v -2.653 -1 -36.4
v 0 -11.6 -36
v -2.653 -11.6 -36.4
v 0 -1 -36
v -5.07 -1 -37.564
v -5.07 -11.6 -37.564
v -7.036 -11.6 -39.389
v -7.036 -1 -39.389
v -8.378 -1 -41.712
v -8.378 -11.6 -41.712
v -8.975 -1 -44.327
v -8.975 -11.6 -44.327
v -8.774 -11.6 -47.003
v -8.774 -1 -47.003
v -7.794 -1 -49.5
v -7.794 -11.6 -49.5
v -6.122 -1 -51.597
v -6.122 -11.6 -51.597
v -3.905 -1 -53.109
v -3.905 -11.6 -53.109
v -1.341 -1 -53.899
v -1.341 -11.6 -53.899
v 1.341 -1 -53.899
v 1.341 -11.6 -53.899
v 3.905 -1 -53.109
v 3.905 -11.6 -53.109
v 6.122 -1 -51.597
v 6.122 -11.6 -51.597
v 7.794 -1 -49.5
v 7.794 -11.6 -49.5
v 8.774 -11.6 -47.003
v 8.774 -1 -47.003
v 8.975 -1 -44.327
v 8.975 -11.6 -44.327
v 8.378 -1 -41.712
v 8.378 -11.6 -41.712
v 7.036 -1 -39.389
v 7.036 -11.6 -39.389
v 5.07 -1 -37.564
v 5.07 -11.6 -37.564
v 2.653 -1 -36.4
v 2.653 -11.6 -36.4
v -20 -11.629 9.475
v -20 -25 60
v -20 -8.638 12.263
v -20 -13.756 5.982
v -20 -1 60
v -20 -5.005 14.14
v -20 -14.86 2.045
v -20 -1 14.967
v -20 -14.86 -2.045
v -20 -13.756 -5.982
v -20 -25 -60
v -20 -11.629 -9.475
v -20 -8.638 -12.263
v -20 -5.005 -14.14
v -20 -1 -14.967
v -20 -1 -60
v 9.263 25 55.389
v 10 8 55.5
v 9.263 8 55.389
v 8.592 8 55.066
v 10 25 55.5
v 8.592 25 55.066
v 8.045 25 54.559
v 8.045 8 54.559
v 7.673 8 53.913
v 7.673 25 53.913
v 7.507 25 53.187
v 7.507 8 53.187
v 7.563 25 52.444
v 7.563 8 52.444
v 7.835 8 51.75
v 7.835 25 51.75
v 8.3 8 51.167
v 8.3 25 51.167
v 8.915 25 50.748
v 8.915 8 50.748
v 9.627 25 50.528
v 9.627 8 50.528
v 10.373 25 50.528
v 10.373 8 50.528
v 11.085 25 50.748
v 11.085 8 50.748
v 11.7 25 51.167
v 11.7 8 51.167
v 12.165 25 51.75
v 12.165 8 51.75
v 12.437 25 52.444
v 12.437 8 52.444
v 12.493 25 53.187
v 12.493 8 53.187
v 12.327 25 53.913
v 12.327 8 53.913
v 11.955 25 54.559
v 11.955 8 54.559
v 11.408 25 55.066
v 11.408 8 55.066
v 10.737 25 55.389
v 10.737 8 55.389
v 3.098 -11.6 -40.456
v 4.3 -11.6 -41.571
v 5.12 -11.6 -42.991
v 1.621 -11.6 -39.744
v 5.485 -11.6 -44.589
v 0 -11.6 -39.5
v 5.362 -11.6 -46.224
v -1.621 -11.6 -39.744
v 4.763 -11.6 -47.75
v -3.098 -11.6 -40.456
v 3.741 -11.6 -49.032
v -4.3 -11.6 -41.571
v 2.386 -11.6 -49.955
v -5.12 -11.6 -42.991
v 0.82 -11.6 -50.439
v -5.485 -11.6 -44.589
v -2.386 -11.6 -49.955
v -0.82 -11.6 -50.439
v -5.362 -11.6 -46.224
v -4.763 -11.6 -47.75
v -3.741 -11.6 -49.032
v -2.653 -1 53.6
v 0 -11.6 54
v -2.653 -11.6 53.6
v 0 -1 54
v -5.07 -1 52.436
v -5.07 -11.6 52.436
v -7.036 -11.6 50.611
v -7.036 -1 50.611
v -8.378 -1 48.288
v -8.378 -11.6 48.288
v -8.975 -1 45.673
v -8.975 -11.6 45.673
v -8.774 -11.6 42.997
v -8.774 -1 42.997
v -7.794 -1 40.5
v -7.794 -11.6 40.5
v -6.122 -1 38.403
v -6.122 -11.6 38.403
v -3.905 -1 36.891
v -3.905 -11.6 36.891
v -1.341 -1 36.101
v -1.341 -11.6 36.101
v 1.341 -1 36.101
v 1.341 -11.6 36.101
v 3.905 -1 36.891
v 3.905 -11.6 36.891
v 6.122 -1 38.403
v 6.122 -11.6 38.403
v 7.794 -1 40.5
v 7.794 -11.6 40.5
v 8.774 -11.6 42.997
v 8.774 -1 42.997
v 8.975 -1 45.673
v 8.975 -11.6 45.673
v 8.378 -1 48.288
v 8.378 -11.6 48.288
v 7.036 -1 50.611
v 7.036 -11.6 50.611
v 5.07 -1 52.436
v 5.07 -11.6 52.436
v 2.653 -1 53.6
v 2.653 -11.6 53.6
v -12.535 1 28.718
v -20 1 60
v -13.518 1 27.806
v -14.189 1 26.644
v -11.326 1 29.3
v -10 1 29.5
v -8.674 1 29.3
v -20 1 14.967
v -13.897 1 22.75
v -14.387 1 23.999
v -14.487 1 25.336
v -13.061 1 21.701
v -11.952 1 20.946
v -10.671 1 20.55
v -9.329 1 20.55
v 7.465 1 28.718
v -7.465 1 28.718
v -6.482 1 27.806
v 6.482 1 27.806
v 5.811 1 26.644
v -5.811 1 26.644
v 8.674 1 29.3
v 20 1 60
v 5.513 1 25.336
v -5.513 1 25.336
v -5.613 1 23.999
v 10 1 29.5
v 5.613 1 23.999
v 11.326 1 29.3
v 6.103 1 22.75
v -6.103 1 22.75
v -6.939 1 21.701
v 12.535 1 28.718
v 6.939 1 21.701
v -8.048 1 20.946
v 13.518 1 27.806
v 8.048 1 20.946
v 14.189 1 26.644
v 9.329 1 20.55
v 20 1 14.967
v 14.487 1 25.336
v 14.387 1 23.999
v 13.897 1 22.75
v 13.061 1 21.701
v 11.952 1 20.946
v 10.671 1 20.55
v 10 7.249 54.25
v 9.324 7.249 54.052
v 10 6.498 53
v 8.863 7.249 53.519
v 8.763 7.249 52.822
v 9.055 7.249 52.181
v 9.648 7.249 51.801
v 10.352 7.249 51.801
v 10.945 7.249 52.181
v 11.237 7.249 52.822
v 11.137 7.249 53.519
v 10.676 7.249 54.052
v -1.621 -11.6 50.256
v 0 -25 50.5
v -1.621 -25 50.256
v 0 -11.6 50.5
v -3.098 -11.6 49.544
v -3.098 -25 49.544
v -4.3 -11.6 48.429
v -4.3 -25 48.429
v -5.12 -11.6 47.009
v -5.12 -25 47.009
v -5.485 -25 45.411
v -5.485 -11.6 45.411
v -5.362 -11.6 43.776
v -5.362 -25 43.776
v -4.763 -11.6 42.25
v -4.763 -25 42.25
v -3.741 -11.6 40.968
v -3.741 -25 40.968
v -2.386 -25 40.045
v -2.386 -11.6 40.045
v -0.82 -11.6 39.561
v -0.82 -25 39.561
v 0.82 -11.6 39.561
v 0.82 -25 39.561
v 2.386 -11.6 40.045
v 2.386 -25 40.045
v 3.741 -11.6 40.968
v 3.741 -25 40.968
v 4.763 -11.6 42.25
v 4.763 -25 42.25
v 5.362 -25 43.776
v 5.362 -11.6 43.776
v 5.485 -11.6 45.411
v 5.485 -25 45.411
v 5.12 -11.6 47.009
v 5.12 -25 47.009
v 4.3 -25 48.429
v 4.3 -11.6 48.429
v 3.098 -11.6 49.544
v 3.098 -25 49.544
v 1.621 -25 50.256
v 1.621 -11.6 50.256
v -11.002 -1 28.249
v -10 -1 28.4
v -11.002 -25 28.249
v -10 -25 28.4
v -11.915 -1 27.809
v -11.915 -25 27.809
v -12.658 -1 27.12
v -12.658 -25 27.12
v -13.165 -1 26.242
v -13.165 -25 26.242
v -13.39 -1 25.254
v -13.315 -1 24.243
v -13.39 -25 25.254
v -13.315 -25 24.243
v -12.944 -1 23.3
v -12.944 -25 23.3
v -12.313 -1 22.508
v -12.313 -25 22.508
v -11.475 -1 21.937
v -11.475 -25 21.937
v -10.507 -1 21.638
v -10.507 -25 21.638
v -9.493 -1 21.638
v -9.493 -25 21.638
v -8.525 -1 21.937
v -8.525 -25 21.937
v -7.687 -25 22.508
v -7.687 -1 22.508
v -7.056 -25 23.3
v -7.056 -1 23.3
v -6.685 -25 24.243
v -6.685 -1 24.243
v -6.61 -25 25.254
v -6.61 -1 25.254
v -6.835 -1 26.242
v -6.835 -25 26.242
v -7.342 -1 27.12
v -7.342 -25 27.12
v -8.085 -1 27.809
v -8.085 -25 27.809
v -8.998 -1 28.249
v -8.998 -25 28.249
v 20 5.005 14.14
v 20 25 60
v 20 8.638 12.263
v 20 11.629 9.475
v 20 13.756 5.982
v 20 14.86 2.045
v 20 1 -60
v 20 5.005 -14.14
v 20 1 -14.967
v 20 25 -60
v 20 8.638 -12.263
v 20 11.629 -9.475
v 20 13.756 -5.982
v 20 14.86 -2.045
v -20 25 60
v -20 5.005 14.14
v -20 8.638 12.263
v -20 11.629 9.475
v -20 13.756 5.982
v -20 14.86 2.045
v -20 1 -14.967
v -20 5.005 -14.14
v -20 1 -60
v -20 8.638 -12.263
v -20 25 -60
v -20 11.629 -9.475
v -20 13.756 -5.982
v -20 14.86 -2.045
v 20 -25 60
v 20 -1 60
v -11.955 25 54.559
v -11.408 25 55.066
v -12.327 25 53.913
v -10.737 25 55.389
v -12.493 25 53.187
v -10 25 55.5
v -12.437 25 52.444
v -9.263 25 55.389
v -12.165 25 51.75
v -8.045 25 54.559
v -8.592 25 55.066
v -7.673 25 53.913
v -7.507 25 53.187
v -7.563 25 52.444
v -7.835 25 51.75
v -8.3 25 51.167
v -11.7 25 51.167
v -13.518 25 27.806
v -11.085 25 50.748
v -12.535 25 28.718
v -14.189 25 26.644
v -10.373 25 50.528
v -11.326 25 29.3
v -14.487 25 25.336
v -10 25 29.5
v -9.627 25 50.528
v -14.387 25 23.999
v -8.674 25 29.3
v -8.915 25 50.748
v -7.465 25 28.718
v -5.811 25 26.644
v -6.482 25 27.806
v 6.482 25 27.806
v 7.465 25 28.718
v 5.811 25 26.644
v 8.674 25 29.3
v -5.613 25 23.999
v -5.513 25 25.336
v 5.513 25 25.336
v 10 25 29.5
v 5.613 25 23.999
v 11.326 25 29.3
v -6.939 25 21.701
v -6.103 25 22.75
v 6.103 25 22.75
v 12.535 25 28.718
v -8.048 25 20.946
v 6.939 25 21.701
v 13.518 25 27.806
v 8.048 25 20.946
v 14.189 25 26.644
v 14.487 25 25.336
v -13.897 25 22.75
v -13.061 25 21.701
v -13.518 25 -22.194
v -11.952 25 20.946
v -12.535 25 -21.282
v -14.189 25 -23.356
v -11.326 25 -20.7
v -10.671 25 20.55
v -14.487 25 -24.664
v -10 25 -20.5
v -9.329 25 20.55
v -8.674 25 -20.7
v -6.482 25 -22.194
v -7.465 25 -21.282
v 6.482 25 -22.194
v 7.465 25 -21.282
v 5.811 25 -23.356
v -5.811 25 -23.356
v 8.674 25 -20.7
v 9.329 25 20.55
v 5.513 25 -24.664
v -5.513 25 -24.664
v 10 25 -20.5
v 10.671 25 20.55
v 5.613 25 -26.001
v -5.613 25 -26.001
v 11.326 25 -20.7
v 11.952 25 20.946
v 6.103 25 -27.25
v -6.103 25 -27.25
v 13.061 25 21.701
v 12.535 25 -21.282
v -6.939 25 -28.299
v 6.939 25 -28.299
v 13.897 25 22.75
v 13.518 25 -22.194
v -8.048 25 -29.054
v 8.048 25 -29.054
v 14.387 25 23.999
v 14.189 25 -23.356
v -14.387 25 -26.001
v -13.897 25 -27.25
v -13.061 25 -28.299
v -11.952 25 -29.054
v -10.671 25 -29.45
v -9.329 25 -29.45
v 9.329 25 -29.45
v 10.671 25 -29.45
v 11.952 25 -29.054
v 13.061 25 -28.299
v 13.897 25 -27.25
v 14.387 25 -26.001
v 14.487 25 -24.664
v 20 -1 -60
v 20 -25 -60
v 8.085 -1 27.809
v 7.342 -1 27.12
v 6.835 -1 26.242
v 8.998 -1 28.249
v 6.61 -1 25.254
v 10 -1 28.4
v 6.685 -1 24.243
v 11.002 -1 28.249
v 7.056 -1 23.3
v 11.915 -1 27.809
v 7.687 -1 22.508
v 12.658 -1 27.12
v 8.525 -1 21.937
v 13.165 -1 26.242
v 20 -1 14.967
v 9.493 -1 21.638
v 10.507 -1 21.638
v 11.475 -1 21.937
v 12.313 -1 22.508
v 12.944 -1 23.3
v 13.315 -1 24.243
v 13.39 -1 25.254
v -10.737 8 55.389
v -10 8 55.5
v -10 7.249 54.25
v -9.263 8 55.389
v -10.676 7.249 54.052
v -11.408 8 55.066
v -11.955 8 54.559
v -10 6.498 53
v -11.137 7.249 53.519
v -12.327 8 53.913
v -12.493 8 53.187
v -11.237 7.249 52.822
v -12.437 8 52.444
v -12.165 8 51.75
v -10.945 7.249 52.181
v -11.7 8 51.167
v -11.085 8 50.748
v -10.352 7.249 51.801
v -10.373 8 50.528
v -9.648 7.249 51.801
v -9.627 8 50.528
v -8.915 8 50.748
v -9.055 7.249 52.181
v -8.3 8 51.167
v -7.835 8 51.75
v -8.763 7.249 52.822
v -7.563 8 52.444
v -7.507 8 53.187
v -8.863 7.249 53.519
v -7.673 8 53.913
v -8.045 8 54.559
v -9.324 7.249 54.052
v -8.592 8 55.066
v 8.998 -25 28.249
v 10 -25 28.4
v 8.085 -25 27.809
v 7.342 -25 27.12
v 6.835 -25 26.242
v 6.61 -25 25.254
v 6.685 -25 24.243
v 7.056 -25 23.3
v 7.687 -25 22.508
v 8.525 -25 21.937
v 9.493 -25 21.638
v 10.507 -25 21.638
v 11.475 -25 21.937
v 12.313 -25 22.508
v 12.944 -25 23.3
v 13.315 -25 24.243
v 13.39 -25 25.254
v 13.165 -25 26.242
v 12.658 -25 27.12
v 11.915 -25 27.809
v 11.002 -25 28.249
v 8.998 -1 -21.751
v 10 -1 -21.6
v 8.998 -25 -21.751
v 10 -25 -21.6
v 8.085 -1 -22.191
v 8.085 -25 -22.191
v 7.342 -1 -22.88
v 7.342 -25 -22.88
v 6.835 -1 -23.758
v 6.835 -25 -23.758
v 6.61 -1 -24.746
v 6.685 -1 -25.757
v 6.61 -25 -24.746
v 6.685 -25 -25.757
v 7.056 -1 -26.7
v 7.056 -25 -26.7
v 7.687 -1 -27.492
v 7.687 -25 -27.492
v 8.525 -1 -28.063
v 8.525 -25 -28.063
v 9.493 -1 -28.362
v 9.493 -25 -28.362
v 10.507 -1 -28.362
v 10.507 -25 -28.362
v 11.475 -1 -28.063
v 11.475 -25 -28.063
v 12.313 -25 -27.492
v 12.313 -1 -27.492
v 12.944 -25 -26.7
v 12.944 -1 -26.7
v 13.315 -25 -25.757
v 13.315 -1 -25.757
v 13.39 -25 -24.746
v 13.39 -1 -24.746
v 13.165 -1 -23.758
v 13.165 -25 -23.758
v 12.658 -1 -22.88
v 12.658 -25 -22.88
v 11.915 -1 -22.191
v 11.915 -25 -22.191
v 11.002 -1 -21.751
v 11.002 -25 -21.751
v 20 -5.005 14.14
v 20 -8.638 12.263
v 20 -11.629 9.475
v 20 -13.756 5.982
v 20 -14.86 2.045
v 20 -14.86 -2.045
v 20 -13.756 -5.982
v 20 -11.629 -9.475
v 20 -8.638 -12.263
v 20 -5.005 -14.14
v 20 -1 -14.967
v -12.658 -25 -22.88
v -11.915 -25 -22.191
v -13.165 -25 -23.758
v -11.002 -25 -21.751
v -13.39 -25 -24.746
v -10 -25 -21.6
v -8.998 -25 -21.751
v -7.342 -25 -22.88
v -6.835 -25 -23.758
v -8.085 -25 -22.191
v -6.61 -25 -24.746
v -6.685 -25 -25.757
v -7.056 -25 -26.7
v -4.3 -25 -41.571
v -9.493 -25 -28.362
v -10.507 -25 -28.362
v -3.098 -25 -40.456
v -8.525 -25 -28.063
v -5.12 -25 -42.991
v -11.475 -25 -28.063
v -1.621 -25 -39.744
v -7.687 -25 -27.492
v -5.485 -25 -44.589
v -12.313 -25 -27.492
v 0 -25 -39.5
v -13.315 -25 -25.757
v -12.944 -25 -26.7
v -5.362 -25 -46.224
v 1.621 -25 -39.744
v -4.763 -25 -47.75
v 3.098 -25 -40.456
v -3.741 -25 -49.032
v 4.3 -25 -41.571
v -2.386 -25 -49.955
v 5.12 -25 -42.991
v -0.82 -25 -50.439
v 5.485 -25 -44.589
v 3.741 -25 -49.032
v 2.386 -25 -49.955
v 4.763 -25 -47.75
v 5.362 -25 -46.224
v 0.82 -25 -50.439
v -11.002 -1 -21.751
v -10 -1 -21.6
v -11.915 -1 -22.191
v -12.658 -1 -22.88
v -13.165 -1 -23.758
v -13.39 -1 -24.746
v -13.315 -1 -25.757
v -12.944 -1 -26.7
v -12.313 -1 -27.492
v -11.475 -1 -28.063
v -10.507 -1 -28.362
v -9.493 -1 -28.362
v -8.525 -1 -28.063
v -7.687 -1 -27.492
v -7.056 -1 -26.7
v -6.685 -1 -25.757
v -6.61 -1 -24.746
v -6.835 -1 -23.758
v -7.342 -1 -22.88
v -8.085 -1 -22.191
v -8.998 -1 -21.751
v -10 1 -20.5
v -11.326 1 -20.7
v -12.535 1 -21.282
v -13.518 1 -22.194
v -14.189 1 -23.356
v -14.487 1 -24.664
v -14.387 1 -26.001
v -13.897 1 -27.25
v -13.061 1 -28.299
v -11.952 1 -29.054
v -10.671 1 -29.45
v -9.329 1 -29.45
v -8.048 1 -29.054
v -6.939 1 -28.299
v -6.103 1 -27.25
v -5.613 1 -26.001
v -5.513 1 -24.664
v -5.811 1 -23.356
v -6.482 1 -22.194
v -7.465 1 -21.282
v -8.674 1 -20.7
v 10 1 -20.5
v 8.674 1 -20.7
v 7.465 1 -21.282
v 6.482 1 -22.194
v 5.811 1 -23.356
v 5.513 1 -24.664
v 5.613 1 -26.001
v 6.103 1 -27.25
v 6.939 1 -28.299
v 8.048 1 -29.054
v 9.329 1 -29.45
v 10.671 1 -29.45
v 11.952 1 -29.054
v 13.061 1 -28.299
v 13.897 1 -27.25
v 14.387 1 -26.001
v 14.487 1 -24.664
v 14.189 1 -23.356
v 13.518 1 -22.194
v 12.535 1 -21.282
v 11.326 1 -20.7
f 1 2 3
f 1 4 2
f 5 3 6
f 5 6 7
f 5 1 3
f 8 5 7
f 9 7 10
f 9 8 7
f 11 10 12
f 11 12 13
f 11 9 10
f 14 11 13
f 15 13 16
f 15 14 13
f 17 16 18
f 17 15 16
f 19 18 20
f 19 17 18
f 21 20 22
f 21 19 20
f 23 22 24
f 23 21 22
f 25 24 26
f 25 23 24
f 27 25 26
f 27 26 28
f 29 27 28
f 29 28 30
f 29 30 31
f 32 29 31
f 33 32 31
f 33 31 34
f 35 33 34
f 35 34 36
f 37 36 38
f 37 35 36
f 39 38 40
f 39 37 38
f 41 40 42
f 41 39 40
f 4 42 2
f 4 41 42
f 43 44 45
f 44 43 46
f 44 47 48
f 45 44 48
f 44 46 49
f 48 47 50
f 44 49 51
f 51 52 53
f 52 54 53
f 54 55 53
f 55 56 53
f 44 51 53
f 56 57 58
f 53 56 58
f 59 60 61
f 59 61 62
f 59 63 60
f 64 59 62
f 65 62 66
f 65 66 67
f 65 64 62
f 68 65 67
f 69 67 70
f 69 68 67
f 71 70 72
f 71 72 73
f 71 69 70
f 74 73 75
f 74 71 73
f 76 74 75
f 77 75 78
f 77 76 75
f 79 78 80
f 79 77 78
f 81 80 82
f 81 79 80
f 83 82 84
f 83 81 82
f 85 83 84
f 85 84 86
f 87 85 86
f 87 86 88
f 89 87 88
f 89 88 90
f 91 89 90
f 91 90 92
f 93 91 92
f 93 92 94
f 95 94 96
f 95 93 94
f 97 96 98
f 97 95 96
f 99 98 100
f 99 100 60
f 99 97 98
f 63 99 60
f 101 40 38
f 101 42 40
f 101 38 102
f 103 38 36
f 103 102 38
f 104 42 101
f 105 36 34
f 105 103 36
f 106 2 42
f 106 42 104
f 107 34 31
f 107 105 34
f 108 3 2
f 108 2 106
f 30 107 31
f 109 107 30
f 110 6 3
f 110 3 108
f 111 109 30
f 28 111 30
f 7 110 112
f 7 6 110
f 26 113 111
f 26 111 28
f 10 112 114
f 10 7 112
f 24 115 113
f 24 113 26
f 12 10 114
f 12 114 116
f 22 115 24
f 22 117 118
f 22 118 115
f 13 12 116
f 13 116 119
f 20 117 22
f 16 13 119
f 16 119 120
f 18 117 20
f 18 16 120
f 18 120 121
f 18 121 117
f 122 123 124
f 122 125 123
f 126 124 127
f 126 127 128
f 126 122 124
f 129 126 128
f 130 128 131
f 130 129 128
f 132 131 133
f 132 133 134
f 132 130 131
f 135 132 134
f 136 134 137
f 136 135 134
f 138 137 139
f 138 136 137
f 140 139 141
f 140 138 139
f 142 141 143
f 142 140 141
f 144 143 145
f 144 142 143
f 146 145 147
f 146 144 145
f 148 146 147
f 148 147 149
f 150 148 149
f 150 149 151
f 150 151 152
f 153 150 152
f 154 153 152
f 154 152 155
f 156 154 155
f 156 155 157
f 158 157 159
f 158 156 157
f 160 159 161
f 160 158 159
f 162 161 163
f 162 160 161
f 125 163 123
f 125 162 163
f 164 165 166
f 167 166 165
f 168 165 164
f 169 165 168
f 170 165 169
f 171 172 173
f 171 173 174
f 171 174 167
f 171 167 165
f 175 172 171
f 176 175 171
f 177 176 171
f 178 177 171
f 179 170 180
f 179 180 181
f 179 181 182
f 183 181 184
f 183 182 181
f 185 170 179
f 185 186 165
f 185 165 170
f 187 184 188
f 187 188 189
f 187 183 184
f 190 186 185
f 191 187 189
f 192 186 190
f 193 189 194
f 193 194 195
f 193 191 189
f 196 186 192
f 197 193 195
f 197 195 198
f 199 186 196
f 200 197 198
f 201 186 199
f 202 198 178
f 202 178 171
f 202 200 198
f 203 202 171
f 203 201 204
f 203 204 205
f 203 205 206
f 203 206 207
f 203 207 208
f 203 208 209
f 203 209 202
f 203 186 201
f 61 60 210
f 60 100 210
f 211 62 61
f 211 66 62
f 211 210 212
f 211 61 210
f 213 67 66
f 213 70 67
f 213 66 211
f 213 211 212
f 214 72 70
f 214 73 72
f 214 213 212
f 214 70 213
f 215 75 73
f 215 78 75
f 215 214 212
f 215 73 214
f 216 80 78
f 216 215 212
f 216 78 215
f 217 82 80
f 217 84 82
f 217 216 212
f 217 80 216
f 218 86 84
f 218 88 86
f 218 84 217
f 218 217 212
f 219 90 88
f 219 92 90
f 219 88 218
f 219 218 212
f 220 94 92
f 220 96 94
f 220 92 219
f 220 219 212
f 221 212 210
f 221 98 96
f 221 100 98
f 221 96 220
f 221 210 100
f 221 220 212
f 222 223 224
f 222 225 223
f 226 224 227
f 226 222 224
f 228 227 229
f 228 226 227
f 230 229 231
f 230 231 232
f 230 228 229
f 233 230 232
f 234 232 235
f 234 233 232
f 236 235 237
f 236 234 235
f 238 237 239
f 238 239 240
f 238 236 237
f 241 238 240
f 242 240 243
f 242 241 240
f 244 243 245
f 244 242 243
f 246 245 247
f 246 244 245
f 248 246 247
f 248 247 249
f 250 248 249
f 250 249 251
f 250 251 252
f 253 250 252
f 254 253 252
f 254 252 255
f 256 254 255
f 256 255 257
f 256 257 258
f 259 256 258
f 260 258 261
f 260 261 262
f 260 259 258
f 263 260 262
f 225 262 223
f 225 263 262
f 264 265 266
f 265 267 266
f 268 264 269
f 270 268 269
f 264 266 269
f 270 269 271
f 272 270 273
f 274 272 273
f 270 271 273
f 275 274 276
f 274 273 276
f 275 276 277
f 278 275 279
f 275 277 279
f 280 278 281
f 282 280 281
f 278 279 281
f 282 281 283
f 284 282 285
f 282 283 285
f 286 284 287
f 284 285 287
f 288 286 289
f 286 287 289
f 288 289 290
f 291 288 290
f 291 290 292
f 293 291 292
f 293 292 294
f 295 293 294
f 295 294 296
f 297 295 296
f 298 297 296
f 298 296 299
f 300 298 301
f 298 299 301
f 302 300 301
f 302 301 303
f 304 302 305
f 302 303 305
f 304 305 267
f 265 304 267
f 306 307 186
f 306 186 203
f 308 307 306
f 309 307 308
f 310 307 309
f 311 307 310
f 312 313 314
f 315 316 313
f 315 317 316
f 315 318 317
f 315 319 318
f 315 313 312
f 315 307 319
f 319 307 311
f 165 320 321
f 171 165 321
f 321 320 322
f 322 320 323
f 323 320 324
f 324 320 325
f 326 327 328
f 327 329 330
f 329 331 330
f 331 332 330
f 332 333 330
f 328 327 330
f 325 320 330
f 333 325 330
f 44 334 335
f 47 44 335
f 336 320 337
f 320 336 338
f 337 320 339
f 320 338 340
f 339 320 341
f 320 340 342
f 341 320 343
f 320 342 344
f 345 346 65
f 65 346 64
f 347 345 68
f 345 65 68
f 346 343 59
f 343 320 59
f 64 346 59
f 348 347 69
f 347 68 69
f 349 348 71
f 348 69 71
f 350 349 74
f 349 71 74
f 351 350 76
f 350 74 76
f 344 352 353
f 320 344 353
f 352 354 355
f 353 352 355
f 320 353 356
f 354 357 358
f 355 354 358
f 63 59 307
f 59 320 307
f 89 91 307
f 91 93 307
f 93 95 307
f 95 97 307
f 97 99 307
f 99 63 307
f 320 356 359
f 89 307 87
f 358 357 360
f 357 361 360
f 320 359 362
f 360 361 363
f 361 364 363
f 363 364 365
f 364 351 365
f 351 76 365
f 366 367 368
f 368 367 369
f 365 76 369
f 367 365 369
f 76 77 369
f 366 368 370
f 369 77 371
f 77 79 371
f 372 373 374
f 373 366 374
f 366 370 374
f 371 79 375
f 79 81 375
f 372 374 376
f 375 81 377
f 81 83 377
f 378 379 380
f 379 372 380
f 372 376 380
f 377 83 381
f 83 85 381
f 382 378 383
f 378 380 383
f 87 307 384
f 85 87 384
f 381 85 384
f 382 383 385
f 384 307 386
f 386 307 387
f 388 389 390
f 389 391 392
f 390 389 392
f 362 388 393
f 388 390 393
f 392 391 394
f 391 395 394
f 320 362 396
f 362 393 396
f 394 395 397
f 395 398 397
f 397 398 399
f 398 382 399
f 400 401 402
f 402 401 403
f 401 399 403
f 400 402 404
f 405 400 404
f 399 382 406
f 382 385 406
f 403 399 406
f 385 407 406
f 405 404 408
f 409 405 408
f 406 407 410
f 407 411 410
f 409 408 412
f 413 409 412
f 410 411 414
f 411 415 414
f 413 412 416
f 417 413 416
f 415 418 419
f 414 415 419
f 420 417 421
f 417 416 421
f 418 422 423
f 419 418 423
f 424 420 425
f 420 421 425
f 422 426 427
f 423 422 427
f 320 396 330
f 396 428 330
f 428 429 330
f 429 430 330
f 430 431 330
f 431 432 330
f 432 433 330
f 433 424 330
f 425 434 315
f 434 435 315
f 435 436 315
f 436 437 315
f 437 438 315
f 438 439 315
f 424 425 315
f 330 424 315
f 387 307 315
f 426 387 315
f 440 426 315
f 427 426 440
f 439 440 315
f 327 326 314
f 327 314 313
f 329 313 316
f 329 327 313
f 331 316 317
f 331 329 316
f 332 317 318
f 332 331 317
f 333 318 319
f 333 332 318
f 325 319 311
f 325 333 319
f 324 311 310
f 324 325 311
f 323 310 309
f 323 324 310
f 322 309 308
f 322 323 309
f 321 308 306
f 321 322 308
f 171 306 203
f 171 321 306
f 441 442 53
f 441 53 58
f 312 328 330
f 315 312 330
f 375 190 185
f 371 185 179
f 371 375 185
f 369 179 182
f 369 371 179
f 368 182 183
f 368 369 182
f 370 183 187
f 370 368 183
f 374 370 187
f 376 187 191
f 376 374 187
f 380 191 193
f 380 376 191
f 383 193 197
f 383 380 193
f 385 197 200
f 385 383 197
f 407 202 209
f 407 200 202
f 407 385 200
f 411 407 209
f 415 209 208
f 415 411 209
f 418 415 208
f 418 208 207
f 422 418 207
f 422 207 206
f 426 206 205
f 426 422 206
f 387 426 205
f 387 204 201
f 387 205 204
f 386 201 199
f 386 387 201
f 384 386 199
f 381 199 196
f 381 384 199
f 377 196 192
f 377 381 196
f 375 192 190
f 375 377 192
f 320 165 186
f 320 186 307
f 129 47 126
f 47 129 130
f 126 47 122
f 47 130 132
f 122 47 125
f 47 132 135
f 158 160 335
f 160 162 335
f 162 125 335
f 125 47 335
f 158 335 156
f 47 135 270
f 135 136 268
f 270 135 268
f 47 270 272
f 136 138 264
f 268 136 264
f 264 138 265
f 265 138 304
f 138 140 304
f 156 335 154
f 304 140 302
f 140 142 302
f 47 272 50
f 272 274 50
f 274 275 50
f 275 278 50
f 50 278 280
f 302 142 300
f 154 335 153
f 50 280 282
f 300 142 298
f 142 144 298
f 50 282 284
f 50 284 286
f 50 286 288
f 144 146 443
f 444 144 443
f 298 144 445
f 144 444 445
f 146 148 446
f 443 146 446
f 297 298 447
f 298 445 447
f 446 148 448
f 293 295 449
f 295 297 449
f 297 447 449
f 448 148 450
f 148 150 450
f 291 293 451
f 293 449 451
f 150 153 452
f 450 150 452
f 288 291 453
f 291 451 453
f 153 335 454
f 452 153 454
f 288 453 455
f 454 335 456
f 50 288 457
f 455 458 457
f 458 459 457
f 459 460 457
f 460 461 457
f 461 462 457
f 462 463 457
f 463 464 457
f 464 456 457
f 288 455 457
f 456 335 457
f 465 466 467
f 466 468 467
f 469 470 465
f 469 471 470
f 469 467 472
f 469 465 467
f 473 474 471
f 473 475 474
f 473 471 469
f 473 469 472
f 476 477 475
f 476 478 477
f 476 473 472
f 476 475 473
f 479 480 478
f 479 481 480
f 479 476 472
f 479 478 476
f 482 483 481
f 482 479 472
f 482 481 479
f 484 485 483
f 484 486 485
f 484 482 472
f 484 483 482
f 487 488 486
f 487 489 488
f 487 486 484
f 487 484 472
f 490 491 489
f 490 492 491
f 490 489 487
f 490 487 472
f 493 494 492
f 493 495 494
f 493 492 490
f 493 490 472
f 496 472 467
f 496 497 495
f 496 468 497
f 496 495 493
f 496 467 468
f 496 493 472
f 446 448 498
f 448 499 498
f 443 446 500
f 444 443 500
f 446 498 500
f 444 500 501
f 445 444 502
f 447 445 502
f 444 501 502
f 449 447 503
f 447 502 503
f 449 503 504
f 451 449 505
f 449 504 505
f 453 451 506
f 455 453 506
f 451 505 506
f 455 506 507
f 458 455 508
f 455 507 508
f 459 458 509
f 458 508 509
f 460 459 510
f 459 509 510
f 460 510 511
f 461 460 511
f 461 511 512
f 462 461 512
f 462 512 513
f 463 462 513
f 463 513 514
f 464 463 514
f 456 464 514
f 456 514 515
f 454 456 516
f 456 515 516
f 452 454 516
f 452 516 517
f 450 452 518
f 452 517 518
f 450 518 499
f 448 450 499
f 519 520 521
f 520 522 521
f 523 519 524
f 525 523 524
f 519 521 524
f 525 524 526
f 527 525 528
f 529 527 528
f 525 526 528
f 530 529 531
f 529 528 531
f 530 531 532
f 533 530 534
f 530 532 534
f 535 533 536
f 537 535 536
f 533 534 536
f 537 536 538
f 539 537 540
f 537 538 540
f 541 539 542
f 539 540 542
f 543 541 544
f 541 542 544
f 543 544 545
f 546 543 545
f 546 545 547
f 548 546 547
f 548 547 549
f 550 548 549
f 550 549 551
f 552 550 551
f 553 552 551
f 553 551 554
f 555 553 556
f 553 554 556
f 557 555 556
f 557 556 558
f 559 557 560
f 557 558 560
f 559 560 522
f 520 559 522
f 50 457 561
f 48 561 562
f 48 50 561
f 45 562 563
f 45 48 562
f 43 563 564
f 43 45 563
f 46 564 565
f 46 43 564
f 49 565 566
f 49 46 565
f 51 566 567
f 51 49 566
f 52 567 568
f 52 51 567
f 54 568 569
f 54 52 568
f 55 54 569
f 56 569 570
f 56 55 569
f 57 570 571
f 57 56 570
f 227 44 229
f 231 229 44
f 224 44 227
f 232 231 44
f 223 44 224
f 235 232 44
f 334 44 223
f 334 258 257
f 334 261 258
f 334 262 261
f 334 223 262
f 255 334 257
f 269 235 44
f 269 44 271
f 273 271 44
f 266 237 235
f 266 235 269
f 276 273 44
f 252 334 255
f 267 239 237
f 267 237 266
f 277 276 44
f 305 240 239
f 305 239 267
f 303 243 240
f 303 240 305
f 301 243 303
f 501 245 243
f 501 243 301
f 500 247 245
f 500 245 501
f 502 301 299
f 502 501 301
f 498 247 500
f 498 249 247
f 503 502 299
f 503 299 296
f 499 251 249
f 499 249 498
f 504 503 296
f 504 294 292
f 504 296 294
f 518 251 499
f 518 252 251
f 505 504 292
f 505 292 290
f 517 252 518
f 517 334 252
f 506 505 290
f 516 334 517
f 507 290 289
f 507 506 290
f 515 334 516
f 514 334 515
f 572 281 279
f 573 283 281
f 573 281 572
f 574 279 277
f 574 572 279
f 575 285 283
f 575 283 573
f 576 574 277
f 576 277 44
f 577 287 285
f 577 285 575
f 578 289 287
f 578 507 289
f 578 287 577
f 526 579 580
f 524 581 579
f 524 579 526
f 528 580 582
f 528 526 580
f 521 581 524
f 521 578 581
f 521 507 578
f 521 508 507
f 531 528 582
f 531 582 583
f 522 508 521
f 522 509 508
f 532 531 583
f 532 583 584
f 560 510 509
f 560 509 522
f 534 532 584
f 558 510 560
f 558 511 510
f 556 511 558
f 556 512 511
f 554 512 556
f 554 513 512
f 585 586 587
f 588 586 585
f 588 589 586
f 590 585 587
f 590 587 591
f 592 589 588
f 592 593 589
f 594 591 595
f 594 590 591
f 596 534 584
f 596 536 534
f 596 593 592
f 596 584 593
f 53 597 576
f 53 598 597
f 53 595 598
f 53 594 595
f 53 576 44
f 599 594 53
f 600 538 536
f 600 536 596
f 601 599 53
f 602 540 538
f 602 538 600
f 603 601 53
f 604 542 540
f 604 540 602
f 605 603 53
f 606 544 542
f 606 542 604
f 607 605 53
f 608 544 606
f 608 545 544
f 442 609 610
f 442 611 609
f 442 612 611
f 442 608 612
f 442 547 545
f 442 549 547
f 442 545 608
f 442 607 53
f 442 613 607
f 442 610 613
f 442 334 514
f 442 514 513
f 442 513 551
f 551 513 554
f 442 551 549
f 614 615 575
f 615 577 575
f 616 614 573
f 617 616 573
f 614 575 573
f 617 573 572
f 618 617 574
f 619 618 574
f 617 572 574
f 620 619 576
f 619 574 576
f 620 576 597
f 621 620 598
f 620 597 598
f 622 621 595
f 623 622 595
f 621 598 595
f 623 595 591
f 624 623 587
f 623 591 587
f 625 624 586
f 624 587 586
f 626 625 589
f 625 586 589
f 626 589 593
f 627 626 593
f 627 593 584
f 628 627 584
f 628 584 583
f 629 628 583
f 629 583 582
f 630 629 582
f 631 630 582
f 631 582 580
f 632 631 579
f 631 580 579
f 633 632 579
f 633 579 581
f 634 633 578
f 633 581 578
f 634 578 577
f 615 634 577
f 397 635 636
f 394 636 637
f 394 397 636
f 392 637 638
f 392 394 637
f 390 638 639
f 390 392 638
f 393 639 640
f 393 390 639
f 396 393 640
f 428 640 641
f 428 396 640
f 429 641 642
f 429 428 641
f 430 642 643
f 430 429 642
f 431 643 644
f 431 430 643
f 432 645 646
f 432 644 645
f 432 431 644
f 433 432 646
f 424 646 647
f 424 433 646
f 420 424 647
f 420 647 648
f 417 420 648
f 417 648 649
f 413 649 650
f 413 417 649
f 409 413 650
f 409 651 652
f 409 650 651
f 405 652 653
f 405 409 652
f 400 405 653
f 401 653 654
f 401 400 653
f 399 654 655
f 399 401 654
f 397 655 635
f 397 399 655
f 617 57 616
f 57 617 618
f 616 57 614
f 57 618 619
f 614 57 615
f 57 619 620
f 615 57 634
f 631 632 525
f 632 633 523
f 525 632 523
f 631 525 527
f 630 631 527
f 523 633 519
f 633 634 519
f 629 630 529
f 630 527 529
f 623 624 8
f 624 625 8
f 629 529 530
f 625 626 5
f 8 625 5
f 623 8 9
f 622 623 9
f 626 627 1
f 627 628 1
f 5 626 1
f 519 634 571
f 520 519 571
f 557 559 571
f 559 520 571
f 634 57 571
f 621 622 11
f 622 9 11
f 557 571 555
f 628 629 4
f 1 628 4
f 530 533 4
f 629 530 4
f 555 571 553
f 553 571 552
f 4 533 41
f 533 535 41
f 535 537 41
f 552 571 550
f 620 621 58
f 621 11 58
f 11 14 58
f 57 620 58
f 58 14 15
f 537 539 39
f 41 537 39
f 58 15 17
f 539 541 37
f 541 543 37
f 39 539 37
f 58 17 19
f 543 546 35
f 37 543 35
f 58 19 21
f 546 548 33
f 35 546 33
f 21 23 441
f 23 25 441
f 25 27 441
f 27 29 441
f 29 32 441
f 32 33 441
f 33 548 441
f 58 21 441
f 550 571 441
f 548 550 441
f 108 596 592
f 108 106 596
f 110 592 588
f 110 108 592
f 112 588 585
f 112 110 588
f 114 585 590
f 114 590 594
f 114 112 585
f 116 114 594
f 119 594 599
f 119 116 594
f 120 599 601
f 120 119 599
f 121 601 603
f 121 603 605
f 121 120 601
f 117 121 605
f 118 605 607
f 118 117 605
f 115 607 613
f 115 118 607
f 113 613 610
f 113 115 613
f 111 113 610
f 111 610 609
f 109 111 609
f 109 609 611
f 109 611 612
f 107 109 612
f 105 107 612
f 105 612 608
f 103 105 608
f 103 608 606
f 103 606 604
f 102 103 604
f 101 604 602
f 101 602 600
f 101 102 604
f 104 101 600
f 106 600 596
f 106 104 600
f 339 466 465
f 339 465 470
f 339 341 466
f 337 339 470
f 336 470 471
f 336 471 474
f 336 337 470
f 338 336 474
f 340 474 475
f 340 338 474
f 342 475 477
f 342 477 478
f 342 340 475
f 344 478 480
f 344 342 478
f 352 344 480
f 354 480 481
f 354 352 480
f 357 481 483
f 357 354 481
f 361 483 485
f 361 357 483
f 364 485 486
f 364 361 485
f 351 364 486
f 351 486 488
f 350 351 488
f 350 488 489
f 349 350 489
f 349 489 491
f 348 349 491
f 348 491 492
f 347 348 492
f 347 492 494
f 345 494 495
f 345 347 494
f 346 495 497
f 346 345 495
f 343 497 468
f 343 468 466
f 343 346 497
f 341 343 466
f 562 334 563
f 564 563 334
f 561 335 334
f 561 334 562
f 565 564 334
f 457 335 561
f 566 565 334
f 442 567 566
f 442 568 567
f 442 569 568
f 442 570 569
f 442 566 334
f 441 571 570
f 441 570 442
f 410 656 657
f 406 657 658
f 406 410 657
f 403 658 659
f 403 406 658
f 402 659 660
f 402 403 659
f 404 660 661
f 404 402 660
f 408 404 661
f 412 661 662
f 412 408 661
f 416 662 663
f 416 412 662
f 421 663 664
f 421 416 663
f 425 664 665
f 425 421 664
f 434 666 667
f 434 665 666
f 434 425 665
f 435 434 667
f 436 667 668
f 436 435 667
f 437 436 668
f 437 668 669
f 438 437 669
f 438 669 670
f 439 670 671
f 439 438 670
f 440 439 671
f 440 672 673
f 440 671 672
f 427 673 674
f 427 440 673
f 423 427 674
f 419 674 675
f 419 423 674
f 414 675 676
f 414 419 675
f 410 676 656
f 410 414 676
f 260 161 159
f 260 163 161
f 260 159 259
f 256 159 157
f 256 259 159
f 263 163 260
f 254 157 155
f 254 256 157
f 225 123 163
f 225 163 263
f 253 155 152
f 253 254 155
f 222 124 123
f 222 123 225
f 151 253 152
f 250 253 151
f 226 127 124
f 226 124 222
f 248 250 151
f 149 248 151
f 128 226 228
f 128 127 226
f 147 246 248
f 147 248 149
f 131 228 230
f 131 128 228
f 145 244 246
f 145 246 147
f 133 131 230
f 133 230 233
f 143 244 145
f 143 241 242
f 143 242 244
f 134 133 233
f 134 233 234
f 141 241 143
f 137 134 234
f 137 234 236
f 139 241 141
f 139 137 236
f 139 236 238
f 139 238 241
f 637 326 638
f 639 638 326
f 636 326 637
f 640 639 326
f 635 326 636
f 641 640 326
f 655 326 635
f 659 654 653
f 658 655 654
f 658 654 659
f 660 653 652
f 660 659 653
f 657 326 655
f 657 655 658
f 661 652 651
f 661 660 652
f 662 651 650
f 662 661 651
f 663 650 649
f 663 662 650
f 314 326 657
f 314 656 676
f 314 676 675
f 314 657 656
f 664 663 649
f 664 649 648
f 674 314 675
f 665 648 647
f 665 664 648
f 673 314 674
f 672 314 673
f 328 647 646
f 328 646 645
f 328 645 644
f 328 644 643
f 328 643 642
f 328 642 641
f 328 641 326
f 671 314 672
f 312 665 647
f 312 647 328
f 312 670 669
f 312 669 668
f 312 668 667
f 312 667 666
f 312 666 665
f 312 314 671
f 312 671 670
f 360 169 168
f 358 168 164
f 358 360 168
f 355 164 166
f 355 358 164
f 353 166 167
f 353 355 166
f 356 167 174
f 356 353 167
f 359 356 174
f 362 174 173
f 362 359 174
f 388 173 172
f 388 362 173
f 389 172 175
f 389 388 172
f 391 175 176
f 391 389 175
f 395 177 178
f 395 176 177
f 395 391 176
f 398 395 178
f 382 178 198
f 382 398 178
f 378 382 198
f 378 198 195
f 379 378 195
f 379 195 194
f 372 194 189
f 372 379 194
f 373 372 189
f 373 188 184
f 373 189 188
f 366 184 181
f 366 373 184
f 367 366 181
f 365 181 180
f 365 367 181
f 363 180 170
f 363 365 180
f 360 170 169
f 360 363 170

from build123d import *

# Parameters (mm, degrees)
SKIZZE1_W                                    = 120
SKIZZE1_H                                    = 50
SKIZZE1_R                                    = 15
AUFSATZ_LINEAR_AUSTRAGEN1_DEPTH              = 20
SKIZZE2_W                                    = 120
SKIZZE2_H                                    = 2
SCHNITT_LINEAR_AUSTRAGEN1_DEPTH              = 77.321687612
SKIZZE3_W                                    = 3.4
SKIZZE3_H                                    = 24
M8_GEWINDEBOHRUNG1_AT_2_COUNT                = 2
M8_GEWINDEBOHRUNG1_AT_2_PITCH                = 50
M8_GEWINDEBOHRUNG1_AT_3_COUNT                = 2
M8_GEWINDEBOHRUNG1_AT_3_PITCH                = 53.851648071
M8_GEWINDEBOHRUNG1_AT_4_COUNT                = 2
M8_GEWINDEBOHRUNG1_AT_4_PITCH                = 20
F_9_0_9_DURCHMESSER_BOHRUNG1_AT_2_COUNT      = 2
F_9_0_9_DURCHMESSER_BOHRUNG1_AT_2_PITCH      = 50
F_9_0_9_DURCHMESSER_BOHRUNG1_AT_3_COUNT      = 2
F_9_0_9_DURCHMESSER_BOHRUNG1_AT_3_PITCH      = 53.851648071
F_9_0_9_DURCHMESSER_BOHRUNG1_AT_4_COUNT      = 2
F_9_0_9_DURCHMESSER_BOHRUNG1_AT_4_PITCH      = 20
STIRNSENKUNG_F_R_M10_ZYLINDERSCHRAUB_2_COUNT = 2
STIRNSENKUNG_F_R_M10_ZYLINDERSCHRAUB_2_PITCH = 90
M6_GEWINDEBOHRUNG1_AT_2_COUNT                = 2
M6_GEWINDEBOHRUNG1_AT_2_PITCH                = 20


with BuildPart() as part:
    # Skizze1 → Aufsatz-Linear austragen1 (new, symmetric)
    with BuildSketch(Plane(origin=(0, 0, 0), x_dir=(0, 0, -1), z_dir=(1, 0, 0))):
        Rectangle(SKIZZE1_W, SKIZZE1_H)
        Circle(SKIZZE1_R, mode=Mode.SUBTRACT)
    extrude(amount=AUFSATZ_LINEAR_AUSTRAGEN1_DEPTH, both=True)

    # Skizze2 → Schnitt-Linear austragen1 (cut, through all)
    with BuildSketch(Plane(origin=(20, 0, 0), x_dir=(0, 0, -1), z_dir=(1, 0, 0))):
        Rectangle(SKIZZE2_W, SKIZZE2_H)
    extrude(amount=-SCHNITT_LINEAR_AUSTRAGEN1_DEPTH, mode=Mode.SUBTRACT)


with BuildPart() as schnitt_linear_austragen1_piece_1:
    # of the separate pieces the step leaves, piece 1, a body of its own (schnitt_linear_austragen1_pieces)
    add(part.part.solids().sort_by_distance((-20, 25, 60))[0])

    # Skizze5 → Ø9.0 (9) Durchmesser Bohrung1 (revolve, cut)
    with BuildSketch(Plane(origin=(-10, 25, 25), x_dir=(0, 0, 1), z_dir=(1, 0, 0))):
        Polygon((0, 0), (0, 27.703872786), (4.5, 25), (4.5, 0), align=None)
    f_9_0_9_durchmesser_bohrung1 = revolve(axis=Axis((-10, 31.35, 25), (0, -1, 0)), mode=Mode.SUBTRACT)

    # Ø9.0 (9) Durchmesser Bohrung1 at 2: Ø9.0 (9) Durchmesser Bohrung1 ×2
    with Locations(*[(0, 0, -i * F_9_0_9_DURCHMESSER_BOHRUNG1_AT_2_PITCH) for i in range(1, F_9_0_9_DURCHMESSER_BOHRUNG1_AT_2_COUNT)]):
        add(f_9_0_9_durchmesser_bohrung1, mode=Mode.SUBTRACT)

    # Ø9.0 (9) Durchmesser Bohrung1 at 3: Ø9.0 (9) Durchmesser Bohrung1 ×2
    with Locations(*[Vector(0.3713906763541037, 0, -0.9284766908852593) * (i * F_9_0_9_DURCHMESSER_BOHRUNG1_AT_3_PITCH) for i in range(1, F_9_0_9_DURCHMESSER_BOHRUNG1_AT_3_COUNT)]):
        add(f_9_0_9_durchmesser_bohrung1, mode=Mode.SUBTRACT)

    # Ø9.0 (9) Durchmesser Bohrung1 at 4: Ø9.0 (9) Durchmesser Bohrung1 ×2
    with Locations(*[(i * F_9_0_9_DURCHMESSER_BOHRUNG1_AT_4_PITCH, 0, 0) for i in range(1, F_9_0_9_DURCHMESSER_BOHRUNG1_AT_4_COUNT)]):
        add(f_9_0_9_durchmesser_bohrung1, mode=Mode.SUBTRACT)

    # Skizze9 → M6 Gewindebohrung1 (revolve, cut)
    with BuildSketch(Plane(origin=(-10, 25, 53), x_dir=(0, 0, 1), z_dir=(1, 0, 0))):
        Polygon((0, 0), (0, 18.502151548), (2.5, 17), (2.5, 0), align=None)
    m6_gewindebohrung1 = revolve(axis=Axis((-10, 31.35, 53), (0, -1, 0)), mode=Mode.SUBTRACT)

    # M6 Gewindebohrung1 at 2: M6 Gewindebohrung1 ×2
    with Locations(*[(i * M6_GEWINDEBOHRUNG1_AT_2_PITCH, 0, 0) for i in range(1, M6_GEWINDEBOHRUNG1_AT_2_COUNT)]):
        add(m6_gewindebohrung1, mode=Mode.SUBTRACT)


with BuildPart() as schnitt_linear_austragen1_piece_2:
    # of the separate pieces the step leaves, piece 2, a body of its own (schnitt_linear_austragen1_pieces)
    add(part.part.solids().sort_by_distance((-20, -25, 60))[0])

    # Skizze3 → M8 Gewindebohrung1 (revolve, cut)
    with BuildSketch(Plane(origin=(10, -1, 25), x_dir=(0, 0, 1), z_dir=(1, 0, 0))):
        with Locations((1.7, 12)):
            Rectangle(SKIZZE3_W, SKIZZE3_H)
    m8_gewindebohrung1 = revolve(axis=Axis((10, 5.35, 25), (0, -1, 0)), mode=Mode.SUBTRACT)

    # M8 Gewindebohrung1 at 2: M8 Gewindebohrung1 ×2
    with Locations(*[(0, 0, -i * M8_GEWINDEBOHRUNG1_AT_2_PITCH) for i in range(1, M8_GEWINDEBOHRUNG1_AT_2_COUNT)]):
        add(m8_gewindebohrung1, mode=Mode.SUBTRACT)

    # M8 Gewindebohrung1 at 3: M8 Gewindebohrung1 ×2
    with Locations(*[Vector(-0.3713906763541038, 0, -0.9284766908852593) * (i * M8_GEWINDEBOHRUNG1_AT_3_PITCH) for i in range(1, M8_GEWINDEBOHRUNG1_AT_3_COUNT)]):
        add(m8_gewindebohrung1, mode=Mode.SUBTRACT)

    # M8 Gewindebohrung1 at 4: M8 Gewindebohrung1 ×2
    with Locations(*[(-i * M8_GEWINDEBOHRUNG1_AT_4_PITCH, 0, 0) for i in range(1, M8_GEWINDEBOHRUNG1_AT_4_COUNT)]):
        add(m8_gewindebohrung1, mode=Mode.SUBTRACT)

    # Skizze7 → Stirnsenkung für M10 Zylinderschraube mit Innensechskant2 (revolve, cut)
    with BuildSketch(Plane(origin=(0, -1, 45), x_dir=(0, 0, 1), z_dir=(1, 0, 0))):
        Polygon((0, 0), (0, 24), (5.5, 24), (5.5, 10.6), (9, 10.6), (9, 0), align=None)
    stirnsenkung_f_r_m10_zylinderschraube_mi = revolve(axis=Axis((0, 5.35, 45), (0, -1, 0)), mode=Mode.SUBTRACT)

    # Stirnsenkung f_r M10 Zylinderschraub 2: Stirnsenkung für M10 Zylinderschraube mit Innensechskant2 ×2
    with Locations(*[(0, 0, -i * STIRNSENKUNG_F_R_M10_ZYLINDERSCHRAUB_2_PITCH) for i in range(1, STIRNSENKUNG_F_R_M10_ZYLINDERSCHRAUB_2_COUNT)]):
        add(stirnsenkung_f_r_m10_zylinderschraube_mi, mode=Mode.SUBTRACT)


solid = Compound([schnitt_linear_austragen1_piece_1.part, schnitt_linear_austragen1_piece_2.part])
